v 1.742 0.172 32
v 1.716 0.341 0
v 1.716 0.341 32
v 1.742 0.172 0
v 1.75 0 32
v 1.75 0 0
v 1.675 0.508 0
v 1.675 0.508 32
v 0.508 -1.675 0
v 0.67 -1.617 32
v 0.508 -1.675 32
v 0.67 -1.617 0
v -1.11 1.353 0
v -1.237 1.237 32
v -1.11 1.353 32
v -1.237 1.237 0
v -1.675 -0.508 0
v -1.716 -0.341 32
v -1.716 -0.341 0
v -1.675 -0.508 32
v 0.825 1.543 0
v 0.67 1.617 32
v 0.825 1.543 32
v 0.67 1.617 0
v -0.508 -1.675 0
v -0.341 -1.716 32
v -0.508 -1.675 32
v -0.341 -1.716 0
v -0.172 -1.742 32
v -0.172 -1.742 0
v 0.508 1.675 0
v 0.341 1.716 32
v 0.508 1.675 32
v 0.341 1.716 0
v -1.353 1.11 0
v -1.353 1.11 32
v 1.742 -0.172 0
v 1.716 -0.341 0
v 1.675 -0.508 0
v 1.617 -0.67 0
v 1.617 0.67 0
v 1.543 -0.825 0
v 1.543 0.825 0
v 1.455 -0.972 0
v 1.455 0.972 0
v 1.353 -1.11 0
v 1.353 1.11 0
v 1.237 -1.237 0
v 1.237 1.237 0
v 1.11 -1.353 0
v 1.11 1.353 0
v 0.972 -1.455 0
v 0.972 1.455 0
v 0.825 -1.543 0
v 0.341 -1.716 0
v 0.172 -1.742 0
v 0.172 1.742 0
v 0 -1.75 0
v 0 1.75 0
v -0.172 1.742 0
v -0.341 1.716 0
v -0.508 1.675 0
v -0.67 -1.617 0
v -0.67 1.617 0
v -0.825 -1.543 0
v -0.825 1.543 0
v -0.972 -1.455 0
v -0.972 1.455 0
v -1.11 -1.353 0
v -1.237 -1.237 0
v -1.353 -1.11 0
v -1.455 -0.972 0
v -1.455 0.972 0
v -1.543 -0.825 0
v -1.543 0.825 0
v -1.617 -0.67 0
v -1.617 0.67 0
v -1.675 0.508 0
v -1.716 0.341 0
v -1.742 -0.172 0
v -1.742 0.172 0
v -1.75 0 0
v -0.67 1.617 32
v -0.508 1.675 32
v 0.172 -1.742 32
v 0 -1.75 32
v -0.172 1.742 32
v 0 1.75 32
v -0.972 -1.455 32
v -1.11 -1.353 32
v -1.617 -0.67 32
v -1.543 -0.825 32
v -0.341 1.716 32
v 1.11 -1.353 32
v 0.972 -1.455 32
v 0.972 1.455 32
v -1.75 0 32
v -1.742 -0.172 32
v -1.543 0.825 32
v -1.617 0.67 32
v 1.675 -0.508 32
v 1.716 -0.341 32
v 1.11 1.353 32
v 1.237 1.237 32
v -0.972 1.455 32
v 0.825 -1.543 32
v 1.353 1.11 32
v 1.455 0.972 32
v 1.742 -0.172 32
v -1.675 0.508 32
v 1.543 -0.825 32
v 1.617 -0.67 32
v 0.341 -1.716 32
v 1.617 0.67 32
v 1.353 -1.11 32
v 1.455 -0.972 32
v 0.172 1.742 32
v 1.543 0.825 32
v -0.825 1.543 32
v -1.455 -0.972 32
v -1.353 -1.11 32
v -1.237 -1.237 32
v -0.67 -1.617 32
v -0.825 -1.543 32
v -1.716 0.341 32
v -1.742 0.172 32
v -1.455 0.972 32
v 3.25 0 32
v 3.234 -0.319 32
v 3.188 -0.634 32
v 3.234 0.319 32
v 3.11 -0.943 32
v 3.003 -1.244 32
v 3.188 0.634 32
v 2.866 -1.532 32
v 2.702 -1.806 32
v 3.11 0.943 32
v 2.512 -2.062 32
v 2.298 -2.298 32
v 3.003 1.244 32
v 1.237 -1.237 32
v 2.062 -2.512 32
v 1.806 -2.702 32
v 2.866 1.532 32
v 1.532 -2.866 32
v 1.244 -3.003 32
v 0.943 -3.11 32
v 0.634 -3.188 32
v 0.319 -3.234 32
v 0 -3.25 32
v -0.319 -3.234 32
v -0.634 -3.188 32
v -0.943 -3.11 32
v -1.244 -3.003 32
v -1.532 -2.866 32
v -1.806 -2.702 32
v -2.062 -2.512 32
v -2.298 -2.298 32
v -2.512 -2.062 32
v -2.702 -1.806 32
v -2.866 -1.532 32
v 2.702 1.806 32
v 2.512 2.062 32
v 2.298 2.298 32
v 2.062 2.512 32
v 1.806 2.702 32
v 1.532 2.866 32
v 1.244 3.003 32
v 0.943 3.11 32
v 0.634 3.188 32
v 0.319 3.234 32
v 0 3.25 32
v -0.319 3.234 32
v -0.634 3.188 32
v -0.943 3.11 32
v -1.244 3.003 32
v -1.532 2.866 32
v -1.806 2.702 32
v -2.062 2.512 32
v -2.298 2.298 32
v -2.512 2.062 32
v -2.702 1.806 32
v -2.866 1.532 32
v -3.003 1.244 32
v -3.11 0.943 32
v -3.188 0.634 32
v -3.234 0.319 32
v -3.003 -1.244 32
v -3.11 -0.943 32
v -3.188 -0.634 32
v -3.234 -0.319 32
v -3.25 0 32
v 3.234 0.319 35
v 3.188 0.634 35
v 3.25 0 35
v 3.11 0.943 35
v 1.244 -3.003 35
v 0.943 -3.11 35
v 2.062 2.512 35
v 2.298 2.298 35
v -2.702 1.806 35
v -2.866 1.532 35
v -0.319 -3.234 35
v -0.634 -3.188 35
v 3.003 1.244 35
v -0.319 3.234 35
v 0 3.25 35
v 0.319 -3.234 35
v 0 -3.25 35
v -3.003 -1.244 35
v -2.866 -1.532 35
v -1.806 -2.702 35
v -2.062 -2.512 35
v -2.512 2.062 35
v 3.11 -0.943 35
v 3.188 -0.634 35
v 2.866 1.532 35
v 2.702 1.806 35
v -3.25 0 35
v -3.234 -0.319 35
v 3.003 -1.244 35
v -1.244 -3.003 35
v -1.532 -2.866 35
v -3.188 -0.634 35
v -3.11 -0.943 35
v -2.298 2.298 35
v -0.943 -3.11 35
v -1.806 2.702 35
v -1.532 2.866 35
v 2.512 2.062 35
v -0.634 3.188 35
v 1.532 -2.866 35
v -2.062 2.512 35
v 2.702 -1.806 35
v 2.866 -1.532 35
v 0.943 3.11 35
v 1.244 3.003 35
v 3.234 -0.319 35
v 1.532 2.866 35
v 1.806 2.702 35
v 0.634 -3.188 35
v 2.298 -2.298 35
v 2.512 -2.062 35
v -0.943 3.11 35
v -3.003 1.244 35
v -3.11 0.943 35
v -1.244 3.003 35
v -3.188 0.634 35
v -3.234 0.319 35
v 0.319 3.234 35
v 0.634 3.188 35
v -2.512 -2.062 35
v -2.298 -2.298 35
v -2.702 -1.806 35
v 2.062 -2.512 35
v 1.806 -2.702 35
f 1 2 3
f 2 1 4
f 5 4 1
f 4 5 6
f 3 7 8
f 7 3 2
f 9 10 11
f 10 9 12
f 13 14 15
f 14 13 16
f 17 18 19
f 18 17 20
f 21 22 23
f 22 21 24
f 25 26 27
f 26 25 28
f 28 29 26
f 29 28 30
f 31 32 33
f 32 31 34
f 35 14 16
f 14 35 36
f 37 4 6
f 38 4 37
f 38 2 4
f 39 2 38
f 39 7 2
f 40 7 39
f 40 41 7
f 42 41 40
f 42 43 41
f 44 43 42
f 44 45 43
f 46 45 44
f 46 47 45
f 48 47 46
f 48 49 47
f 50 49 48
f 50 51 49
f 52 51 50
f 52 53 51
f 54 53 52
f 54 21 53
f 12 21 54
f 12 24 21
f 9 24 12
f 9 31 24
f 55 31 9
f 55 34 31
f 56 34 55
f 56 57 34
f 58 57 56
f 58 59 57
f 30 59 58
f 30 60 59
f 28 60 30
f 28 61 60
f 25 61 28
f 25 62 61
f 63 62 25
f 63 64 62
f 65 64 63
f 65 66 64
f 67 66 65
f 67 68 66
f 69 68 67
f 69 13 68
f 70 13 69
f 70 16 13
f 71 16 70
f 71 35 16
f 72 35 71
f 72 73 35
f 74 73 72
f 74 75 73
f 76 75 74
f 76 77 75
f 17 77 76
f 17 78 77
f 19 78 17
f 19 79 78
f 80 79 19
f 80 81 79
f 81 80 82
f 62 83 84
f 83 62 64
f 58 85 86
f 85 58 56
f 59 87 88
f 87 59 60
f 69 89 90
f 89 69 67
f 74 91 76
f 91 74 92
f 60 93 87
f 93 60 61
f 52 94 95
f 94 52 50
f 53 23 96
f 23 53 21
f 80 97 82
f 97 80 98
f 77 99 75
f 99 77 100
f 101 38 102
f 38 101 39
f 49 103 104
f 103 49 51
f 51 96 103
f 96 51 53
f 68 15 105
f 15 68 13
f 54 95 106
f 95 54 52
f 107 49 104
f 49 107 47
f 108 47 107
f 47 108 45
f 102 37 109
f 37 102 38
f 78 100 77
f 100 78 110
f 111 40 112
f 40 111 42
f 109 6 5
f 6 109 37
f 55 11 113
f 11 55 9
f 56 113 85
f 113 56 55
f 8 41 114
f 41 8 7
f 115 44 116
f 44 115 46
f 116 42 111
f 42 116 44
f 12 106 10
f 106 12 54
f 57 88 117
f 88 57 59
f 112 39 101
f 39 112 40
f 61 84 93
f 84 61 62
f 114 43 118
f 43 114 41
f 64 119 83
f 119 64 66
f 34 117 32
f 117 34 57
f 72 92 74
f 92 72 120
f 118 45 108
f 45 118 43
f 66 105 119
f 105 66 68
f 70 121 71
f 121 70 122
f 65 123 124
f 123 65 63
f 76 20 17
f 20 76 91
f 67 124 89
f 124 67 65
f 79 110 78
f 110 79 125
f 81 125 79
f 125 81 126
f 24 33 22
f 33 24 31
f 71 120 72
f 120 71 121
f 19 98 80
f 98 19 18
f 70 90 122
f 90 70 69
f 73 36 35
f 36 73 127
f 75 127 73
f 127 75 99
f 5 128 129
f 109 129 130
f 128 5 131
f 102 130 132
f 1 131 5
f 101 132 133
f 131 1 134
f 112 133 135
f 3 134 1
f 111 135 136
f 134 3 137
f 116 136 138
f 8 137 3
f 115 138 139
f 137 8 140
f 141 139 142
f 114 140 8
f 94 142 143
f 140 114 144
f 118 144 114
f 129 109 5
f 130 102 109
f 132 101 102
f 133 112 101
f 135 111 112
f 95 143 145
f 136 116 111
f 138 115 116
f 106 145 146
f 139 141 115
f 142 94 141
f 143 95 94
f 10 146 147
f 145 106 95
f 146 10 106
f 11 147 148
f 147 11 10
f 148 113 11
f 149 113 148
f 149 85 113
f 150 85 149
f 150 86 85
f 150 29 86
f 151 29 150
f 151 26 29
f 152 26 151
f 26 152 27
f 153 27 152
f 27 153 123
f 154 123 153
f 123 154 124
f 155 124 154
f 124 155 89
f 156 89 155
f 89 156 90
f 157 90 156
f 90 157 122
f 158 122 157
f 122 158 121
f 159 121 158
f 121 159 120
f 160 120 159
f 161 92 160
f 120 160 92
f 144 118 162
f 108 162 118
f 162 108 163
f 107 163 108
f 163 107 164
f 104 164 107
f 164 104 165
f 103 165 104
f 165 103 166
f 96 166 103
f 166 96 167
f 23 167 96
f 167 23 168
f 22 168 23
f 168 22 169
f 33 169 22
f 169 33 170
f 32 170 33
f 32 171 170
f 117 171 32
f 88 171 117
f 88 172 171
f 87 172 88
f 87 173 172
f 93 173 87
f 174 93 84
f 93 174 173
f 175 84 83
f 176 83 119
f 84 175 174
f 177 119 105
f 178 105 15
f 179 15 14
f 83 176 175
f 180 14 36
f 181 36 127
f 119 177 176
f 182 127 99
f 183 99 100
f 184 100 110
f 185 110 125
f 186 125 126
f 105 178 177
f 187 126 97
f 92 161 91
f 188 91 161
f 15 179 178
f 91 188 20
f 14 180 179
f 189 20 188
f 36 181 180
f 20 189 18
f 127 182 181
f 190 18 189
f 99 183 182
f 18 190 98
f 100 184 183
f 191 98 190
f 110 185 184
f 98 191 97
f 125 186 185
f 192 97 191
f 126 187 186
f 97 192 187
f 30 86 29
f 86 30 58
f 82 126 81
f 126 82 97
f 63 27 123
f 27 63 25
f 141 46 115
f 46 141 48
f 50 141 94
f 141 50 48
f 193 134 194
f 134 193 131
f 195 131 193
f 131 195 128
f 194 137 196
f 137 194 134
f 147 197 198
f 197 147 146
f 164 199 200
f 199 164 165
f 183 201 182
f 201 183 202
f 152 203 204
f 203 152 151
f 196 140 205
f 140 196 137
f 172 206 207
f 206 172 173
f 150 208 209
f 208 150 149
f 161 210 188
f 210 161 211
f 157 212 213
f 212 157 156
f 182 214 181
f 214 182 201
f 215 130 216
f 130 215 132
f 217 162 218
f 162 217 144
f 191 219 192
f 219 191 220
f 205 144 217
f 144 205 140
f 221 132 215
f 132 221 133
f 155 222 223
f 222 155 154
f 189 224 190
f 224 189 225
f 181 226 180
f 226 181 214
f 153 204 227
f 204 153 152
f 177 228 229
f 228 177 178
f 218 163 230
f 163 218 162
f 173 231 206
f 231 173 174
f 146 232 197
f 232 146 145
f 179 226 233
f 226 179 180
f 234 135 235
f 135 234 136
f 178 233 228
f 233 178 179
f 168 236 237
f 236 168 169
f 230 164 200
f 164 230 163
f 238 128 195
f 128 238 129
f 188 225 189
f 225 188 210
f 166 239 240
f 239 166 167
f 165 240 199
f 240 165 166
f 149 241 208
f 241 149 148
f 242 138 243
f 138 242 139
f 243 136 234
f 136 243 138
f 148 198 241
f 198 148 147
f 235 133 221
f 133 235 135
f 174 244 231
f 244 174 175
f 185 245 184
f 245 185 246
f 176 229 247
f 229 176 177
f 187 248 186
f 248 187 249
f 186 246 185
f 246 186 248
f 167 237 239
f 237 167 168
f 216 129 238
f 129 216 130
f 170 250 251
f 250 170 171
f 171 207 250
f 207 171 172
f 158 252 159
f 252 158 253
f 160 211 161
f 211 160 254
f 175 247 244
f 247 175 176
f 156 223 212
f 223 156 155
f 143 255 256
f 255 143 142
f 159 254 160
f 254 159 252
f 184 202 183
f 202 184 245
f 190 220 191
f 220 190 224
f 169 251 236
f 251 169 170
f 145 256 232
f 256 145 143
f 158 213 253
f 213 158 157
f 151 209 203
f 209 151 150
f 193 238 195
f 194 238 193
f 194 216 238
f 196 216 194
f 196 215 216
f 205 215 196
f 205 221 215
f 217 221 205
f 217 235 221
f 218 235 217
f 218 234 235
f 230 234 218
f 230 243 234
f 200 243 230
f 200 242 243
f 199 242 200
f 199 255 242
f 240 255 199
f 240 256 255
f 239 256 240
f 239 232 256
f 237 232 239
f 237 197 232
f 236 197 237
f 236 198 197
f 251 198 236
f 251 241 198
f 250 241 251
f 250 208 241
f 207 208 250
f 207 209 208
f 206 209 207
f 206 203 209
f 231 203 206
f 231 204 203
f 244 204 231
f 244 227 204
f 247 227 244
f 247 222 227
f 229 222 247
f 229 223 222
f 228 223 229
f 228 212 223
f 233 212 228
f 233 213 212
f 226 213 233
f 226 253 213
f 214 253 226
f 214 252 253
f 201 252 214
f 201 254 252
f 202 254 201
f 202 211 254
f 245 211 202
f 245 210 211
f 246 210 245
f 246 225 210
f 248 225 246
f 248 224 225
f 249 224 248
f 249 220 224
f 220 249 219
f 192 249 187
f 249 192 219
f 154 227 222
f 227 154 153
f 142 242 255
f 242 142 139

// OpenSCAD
$fn = 64; // độ mịn bề mặt

// Hình trụ chính dài 32mm, đường kính 3.5mm
cylinder(h = 32, d = 3.5);

// Đầu loe ra (2mm) — nón cụt đường kính 3.5 -> 5mm
translate([0, 0, 32])
cylinder(h = 3, d1 = 6.5, d2 = 6.5);
